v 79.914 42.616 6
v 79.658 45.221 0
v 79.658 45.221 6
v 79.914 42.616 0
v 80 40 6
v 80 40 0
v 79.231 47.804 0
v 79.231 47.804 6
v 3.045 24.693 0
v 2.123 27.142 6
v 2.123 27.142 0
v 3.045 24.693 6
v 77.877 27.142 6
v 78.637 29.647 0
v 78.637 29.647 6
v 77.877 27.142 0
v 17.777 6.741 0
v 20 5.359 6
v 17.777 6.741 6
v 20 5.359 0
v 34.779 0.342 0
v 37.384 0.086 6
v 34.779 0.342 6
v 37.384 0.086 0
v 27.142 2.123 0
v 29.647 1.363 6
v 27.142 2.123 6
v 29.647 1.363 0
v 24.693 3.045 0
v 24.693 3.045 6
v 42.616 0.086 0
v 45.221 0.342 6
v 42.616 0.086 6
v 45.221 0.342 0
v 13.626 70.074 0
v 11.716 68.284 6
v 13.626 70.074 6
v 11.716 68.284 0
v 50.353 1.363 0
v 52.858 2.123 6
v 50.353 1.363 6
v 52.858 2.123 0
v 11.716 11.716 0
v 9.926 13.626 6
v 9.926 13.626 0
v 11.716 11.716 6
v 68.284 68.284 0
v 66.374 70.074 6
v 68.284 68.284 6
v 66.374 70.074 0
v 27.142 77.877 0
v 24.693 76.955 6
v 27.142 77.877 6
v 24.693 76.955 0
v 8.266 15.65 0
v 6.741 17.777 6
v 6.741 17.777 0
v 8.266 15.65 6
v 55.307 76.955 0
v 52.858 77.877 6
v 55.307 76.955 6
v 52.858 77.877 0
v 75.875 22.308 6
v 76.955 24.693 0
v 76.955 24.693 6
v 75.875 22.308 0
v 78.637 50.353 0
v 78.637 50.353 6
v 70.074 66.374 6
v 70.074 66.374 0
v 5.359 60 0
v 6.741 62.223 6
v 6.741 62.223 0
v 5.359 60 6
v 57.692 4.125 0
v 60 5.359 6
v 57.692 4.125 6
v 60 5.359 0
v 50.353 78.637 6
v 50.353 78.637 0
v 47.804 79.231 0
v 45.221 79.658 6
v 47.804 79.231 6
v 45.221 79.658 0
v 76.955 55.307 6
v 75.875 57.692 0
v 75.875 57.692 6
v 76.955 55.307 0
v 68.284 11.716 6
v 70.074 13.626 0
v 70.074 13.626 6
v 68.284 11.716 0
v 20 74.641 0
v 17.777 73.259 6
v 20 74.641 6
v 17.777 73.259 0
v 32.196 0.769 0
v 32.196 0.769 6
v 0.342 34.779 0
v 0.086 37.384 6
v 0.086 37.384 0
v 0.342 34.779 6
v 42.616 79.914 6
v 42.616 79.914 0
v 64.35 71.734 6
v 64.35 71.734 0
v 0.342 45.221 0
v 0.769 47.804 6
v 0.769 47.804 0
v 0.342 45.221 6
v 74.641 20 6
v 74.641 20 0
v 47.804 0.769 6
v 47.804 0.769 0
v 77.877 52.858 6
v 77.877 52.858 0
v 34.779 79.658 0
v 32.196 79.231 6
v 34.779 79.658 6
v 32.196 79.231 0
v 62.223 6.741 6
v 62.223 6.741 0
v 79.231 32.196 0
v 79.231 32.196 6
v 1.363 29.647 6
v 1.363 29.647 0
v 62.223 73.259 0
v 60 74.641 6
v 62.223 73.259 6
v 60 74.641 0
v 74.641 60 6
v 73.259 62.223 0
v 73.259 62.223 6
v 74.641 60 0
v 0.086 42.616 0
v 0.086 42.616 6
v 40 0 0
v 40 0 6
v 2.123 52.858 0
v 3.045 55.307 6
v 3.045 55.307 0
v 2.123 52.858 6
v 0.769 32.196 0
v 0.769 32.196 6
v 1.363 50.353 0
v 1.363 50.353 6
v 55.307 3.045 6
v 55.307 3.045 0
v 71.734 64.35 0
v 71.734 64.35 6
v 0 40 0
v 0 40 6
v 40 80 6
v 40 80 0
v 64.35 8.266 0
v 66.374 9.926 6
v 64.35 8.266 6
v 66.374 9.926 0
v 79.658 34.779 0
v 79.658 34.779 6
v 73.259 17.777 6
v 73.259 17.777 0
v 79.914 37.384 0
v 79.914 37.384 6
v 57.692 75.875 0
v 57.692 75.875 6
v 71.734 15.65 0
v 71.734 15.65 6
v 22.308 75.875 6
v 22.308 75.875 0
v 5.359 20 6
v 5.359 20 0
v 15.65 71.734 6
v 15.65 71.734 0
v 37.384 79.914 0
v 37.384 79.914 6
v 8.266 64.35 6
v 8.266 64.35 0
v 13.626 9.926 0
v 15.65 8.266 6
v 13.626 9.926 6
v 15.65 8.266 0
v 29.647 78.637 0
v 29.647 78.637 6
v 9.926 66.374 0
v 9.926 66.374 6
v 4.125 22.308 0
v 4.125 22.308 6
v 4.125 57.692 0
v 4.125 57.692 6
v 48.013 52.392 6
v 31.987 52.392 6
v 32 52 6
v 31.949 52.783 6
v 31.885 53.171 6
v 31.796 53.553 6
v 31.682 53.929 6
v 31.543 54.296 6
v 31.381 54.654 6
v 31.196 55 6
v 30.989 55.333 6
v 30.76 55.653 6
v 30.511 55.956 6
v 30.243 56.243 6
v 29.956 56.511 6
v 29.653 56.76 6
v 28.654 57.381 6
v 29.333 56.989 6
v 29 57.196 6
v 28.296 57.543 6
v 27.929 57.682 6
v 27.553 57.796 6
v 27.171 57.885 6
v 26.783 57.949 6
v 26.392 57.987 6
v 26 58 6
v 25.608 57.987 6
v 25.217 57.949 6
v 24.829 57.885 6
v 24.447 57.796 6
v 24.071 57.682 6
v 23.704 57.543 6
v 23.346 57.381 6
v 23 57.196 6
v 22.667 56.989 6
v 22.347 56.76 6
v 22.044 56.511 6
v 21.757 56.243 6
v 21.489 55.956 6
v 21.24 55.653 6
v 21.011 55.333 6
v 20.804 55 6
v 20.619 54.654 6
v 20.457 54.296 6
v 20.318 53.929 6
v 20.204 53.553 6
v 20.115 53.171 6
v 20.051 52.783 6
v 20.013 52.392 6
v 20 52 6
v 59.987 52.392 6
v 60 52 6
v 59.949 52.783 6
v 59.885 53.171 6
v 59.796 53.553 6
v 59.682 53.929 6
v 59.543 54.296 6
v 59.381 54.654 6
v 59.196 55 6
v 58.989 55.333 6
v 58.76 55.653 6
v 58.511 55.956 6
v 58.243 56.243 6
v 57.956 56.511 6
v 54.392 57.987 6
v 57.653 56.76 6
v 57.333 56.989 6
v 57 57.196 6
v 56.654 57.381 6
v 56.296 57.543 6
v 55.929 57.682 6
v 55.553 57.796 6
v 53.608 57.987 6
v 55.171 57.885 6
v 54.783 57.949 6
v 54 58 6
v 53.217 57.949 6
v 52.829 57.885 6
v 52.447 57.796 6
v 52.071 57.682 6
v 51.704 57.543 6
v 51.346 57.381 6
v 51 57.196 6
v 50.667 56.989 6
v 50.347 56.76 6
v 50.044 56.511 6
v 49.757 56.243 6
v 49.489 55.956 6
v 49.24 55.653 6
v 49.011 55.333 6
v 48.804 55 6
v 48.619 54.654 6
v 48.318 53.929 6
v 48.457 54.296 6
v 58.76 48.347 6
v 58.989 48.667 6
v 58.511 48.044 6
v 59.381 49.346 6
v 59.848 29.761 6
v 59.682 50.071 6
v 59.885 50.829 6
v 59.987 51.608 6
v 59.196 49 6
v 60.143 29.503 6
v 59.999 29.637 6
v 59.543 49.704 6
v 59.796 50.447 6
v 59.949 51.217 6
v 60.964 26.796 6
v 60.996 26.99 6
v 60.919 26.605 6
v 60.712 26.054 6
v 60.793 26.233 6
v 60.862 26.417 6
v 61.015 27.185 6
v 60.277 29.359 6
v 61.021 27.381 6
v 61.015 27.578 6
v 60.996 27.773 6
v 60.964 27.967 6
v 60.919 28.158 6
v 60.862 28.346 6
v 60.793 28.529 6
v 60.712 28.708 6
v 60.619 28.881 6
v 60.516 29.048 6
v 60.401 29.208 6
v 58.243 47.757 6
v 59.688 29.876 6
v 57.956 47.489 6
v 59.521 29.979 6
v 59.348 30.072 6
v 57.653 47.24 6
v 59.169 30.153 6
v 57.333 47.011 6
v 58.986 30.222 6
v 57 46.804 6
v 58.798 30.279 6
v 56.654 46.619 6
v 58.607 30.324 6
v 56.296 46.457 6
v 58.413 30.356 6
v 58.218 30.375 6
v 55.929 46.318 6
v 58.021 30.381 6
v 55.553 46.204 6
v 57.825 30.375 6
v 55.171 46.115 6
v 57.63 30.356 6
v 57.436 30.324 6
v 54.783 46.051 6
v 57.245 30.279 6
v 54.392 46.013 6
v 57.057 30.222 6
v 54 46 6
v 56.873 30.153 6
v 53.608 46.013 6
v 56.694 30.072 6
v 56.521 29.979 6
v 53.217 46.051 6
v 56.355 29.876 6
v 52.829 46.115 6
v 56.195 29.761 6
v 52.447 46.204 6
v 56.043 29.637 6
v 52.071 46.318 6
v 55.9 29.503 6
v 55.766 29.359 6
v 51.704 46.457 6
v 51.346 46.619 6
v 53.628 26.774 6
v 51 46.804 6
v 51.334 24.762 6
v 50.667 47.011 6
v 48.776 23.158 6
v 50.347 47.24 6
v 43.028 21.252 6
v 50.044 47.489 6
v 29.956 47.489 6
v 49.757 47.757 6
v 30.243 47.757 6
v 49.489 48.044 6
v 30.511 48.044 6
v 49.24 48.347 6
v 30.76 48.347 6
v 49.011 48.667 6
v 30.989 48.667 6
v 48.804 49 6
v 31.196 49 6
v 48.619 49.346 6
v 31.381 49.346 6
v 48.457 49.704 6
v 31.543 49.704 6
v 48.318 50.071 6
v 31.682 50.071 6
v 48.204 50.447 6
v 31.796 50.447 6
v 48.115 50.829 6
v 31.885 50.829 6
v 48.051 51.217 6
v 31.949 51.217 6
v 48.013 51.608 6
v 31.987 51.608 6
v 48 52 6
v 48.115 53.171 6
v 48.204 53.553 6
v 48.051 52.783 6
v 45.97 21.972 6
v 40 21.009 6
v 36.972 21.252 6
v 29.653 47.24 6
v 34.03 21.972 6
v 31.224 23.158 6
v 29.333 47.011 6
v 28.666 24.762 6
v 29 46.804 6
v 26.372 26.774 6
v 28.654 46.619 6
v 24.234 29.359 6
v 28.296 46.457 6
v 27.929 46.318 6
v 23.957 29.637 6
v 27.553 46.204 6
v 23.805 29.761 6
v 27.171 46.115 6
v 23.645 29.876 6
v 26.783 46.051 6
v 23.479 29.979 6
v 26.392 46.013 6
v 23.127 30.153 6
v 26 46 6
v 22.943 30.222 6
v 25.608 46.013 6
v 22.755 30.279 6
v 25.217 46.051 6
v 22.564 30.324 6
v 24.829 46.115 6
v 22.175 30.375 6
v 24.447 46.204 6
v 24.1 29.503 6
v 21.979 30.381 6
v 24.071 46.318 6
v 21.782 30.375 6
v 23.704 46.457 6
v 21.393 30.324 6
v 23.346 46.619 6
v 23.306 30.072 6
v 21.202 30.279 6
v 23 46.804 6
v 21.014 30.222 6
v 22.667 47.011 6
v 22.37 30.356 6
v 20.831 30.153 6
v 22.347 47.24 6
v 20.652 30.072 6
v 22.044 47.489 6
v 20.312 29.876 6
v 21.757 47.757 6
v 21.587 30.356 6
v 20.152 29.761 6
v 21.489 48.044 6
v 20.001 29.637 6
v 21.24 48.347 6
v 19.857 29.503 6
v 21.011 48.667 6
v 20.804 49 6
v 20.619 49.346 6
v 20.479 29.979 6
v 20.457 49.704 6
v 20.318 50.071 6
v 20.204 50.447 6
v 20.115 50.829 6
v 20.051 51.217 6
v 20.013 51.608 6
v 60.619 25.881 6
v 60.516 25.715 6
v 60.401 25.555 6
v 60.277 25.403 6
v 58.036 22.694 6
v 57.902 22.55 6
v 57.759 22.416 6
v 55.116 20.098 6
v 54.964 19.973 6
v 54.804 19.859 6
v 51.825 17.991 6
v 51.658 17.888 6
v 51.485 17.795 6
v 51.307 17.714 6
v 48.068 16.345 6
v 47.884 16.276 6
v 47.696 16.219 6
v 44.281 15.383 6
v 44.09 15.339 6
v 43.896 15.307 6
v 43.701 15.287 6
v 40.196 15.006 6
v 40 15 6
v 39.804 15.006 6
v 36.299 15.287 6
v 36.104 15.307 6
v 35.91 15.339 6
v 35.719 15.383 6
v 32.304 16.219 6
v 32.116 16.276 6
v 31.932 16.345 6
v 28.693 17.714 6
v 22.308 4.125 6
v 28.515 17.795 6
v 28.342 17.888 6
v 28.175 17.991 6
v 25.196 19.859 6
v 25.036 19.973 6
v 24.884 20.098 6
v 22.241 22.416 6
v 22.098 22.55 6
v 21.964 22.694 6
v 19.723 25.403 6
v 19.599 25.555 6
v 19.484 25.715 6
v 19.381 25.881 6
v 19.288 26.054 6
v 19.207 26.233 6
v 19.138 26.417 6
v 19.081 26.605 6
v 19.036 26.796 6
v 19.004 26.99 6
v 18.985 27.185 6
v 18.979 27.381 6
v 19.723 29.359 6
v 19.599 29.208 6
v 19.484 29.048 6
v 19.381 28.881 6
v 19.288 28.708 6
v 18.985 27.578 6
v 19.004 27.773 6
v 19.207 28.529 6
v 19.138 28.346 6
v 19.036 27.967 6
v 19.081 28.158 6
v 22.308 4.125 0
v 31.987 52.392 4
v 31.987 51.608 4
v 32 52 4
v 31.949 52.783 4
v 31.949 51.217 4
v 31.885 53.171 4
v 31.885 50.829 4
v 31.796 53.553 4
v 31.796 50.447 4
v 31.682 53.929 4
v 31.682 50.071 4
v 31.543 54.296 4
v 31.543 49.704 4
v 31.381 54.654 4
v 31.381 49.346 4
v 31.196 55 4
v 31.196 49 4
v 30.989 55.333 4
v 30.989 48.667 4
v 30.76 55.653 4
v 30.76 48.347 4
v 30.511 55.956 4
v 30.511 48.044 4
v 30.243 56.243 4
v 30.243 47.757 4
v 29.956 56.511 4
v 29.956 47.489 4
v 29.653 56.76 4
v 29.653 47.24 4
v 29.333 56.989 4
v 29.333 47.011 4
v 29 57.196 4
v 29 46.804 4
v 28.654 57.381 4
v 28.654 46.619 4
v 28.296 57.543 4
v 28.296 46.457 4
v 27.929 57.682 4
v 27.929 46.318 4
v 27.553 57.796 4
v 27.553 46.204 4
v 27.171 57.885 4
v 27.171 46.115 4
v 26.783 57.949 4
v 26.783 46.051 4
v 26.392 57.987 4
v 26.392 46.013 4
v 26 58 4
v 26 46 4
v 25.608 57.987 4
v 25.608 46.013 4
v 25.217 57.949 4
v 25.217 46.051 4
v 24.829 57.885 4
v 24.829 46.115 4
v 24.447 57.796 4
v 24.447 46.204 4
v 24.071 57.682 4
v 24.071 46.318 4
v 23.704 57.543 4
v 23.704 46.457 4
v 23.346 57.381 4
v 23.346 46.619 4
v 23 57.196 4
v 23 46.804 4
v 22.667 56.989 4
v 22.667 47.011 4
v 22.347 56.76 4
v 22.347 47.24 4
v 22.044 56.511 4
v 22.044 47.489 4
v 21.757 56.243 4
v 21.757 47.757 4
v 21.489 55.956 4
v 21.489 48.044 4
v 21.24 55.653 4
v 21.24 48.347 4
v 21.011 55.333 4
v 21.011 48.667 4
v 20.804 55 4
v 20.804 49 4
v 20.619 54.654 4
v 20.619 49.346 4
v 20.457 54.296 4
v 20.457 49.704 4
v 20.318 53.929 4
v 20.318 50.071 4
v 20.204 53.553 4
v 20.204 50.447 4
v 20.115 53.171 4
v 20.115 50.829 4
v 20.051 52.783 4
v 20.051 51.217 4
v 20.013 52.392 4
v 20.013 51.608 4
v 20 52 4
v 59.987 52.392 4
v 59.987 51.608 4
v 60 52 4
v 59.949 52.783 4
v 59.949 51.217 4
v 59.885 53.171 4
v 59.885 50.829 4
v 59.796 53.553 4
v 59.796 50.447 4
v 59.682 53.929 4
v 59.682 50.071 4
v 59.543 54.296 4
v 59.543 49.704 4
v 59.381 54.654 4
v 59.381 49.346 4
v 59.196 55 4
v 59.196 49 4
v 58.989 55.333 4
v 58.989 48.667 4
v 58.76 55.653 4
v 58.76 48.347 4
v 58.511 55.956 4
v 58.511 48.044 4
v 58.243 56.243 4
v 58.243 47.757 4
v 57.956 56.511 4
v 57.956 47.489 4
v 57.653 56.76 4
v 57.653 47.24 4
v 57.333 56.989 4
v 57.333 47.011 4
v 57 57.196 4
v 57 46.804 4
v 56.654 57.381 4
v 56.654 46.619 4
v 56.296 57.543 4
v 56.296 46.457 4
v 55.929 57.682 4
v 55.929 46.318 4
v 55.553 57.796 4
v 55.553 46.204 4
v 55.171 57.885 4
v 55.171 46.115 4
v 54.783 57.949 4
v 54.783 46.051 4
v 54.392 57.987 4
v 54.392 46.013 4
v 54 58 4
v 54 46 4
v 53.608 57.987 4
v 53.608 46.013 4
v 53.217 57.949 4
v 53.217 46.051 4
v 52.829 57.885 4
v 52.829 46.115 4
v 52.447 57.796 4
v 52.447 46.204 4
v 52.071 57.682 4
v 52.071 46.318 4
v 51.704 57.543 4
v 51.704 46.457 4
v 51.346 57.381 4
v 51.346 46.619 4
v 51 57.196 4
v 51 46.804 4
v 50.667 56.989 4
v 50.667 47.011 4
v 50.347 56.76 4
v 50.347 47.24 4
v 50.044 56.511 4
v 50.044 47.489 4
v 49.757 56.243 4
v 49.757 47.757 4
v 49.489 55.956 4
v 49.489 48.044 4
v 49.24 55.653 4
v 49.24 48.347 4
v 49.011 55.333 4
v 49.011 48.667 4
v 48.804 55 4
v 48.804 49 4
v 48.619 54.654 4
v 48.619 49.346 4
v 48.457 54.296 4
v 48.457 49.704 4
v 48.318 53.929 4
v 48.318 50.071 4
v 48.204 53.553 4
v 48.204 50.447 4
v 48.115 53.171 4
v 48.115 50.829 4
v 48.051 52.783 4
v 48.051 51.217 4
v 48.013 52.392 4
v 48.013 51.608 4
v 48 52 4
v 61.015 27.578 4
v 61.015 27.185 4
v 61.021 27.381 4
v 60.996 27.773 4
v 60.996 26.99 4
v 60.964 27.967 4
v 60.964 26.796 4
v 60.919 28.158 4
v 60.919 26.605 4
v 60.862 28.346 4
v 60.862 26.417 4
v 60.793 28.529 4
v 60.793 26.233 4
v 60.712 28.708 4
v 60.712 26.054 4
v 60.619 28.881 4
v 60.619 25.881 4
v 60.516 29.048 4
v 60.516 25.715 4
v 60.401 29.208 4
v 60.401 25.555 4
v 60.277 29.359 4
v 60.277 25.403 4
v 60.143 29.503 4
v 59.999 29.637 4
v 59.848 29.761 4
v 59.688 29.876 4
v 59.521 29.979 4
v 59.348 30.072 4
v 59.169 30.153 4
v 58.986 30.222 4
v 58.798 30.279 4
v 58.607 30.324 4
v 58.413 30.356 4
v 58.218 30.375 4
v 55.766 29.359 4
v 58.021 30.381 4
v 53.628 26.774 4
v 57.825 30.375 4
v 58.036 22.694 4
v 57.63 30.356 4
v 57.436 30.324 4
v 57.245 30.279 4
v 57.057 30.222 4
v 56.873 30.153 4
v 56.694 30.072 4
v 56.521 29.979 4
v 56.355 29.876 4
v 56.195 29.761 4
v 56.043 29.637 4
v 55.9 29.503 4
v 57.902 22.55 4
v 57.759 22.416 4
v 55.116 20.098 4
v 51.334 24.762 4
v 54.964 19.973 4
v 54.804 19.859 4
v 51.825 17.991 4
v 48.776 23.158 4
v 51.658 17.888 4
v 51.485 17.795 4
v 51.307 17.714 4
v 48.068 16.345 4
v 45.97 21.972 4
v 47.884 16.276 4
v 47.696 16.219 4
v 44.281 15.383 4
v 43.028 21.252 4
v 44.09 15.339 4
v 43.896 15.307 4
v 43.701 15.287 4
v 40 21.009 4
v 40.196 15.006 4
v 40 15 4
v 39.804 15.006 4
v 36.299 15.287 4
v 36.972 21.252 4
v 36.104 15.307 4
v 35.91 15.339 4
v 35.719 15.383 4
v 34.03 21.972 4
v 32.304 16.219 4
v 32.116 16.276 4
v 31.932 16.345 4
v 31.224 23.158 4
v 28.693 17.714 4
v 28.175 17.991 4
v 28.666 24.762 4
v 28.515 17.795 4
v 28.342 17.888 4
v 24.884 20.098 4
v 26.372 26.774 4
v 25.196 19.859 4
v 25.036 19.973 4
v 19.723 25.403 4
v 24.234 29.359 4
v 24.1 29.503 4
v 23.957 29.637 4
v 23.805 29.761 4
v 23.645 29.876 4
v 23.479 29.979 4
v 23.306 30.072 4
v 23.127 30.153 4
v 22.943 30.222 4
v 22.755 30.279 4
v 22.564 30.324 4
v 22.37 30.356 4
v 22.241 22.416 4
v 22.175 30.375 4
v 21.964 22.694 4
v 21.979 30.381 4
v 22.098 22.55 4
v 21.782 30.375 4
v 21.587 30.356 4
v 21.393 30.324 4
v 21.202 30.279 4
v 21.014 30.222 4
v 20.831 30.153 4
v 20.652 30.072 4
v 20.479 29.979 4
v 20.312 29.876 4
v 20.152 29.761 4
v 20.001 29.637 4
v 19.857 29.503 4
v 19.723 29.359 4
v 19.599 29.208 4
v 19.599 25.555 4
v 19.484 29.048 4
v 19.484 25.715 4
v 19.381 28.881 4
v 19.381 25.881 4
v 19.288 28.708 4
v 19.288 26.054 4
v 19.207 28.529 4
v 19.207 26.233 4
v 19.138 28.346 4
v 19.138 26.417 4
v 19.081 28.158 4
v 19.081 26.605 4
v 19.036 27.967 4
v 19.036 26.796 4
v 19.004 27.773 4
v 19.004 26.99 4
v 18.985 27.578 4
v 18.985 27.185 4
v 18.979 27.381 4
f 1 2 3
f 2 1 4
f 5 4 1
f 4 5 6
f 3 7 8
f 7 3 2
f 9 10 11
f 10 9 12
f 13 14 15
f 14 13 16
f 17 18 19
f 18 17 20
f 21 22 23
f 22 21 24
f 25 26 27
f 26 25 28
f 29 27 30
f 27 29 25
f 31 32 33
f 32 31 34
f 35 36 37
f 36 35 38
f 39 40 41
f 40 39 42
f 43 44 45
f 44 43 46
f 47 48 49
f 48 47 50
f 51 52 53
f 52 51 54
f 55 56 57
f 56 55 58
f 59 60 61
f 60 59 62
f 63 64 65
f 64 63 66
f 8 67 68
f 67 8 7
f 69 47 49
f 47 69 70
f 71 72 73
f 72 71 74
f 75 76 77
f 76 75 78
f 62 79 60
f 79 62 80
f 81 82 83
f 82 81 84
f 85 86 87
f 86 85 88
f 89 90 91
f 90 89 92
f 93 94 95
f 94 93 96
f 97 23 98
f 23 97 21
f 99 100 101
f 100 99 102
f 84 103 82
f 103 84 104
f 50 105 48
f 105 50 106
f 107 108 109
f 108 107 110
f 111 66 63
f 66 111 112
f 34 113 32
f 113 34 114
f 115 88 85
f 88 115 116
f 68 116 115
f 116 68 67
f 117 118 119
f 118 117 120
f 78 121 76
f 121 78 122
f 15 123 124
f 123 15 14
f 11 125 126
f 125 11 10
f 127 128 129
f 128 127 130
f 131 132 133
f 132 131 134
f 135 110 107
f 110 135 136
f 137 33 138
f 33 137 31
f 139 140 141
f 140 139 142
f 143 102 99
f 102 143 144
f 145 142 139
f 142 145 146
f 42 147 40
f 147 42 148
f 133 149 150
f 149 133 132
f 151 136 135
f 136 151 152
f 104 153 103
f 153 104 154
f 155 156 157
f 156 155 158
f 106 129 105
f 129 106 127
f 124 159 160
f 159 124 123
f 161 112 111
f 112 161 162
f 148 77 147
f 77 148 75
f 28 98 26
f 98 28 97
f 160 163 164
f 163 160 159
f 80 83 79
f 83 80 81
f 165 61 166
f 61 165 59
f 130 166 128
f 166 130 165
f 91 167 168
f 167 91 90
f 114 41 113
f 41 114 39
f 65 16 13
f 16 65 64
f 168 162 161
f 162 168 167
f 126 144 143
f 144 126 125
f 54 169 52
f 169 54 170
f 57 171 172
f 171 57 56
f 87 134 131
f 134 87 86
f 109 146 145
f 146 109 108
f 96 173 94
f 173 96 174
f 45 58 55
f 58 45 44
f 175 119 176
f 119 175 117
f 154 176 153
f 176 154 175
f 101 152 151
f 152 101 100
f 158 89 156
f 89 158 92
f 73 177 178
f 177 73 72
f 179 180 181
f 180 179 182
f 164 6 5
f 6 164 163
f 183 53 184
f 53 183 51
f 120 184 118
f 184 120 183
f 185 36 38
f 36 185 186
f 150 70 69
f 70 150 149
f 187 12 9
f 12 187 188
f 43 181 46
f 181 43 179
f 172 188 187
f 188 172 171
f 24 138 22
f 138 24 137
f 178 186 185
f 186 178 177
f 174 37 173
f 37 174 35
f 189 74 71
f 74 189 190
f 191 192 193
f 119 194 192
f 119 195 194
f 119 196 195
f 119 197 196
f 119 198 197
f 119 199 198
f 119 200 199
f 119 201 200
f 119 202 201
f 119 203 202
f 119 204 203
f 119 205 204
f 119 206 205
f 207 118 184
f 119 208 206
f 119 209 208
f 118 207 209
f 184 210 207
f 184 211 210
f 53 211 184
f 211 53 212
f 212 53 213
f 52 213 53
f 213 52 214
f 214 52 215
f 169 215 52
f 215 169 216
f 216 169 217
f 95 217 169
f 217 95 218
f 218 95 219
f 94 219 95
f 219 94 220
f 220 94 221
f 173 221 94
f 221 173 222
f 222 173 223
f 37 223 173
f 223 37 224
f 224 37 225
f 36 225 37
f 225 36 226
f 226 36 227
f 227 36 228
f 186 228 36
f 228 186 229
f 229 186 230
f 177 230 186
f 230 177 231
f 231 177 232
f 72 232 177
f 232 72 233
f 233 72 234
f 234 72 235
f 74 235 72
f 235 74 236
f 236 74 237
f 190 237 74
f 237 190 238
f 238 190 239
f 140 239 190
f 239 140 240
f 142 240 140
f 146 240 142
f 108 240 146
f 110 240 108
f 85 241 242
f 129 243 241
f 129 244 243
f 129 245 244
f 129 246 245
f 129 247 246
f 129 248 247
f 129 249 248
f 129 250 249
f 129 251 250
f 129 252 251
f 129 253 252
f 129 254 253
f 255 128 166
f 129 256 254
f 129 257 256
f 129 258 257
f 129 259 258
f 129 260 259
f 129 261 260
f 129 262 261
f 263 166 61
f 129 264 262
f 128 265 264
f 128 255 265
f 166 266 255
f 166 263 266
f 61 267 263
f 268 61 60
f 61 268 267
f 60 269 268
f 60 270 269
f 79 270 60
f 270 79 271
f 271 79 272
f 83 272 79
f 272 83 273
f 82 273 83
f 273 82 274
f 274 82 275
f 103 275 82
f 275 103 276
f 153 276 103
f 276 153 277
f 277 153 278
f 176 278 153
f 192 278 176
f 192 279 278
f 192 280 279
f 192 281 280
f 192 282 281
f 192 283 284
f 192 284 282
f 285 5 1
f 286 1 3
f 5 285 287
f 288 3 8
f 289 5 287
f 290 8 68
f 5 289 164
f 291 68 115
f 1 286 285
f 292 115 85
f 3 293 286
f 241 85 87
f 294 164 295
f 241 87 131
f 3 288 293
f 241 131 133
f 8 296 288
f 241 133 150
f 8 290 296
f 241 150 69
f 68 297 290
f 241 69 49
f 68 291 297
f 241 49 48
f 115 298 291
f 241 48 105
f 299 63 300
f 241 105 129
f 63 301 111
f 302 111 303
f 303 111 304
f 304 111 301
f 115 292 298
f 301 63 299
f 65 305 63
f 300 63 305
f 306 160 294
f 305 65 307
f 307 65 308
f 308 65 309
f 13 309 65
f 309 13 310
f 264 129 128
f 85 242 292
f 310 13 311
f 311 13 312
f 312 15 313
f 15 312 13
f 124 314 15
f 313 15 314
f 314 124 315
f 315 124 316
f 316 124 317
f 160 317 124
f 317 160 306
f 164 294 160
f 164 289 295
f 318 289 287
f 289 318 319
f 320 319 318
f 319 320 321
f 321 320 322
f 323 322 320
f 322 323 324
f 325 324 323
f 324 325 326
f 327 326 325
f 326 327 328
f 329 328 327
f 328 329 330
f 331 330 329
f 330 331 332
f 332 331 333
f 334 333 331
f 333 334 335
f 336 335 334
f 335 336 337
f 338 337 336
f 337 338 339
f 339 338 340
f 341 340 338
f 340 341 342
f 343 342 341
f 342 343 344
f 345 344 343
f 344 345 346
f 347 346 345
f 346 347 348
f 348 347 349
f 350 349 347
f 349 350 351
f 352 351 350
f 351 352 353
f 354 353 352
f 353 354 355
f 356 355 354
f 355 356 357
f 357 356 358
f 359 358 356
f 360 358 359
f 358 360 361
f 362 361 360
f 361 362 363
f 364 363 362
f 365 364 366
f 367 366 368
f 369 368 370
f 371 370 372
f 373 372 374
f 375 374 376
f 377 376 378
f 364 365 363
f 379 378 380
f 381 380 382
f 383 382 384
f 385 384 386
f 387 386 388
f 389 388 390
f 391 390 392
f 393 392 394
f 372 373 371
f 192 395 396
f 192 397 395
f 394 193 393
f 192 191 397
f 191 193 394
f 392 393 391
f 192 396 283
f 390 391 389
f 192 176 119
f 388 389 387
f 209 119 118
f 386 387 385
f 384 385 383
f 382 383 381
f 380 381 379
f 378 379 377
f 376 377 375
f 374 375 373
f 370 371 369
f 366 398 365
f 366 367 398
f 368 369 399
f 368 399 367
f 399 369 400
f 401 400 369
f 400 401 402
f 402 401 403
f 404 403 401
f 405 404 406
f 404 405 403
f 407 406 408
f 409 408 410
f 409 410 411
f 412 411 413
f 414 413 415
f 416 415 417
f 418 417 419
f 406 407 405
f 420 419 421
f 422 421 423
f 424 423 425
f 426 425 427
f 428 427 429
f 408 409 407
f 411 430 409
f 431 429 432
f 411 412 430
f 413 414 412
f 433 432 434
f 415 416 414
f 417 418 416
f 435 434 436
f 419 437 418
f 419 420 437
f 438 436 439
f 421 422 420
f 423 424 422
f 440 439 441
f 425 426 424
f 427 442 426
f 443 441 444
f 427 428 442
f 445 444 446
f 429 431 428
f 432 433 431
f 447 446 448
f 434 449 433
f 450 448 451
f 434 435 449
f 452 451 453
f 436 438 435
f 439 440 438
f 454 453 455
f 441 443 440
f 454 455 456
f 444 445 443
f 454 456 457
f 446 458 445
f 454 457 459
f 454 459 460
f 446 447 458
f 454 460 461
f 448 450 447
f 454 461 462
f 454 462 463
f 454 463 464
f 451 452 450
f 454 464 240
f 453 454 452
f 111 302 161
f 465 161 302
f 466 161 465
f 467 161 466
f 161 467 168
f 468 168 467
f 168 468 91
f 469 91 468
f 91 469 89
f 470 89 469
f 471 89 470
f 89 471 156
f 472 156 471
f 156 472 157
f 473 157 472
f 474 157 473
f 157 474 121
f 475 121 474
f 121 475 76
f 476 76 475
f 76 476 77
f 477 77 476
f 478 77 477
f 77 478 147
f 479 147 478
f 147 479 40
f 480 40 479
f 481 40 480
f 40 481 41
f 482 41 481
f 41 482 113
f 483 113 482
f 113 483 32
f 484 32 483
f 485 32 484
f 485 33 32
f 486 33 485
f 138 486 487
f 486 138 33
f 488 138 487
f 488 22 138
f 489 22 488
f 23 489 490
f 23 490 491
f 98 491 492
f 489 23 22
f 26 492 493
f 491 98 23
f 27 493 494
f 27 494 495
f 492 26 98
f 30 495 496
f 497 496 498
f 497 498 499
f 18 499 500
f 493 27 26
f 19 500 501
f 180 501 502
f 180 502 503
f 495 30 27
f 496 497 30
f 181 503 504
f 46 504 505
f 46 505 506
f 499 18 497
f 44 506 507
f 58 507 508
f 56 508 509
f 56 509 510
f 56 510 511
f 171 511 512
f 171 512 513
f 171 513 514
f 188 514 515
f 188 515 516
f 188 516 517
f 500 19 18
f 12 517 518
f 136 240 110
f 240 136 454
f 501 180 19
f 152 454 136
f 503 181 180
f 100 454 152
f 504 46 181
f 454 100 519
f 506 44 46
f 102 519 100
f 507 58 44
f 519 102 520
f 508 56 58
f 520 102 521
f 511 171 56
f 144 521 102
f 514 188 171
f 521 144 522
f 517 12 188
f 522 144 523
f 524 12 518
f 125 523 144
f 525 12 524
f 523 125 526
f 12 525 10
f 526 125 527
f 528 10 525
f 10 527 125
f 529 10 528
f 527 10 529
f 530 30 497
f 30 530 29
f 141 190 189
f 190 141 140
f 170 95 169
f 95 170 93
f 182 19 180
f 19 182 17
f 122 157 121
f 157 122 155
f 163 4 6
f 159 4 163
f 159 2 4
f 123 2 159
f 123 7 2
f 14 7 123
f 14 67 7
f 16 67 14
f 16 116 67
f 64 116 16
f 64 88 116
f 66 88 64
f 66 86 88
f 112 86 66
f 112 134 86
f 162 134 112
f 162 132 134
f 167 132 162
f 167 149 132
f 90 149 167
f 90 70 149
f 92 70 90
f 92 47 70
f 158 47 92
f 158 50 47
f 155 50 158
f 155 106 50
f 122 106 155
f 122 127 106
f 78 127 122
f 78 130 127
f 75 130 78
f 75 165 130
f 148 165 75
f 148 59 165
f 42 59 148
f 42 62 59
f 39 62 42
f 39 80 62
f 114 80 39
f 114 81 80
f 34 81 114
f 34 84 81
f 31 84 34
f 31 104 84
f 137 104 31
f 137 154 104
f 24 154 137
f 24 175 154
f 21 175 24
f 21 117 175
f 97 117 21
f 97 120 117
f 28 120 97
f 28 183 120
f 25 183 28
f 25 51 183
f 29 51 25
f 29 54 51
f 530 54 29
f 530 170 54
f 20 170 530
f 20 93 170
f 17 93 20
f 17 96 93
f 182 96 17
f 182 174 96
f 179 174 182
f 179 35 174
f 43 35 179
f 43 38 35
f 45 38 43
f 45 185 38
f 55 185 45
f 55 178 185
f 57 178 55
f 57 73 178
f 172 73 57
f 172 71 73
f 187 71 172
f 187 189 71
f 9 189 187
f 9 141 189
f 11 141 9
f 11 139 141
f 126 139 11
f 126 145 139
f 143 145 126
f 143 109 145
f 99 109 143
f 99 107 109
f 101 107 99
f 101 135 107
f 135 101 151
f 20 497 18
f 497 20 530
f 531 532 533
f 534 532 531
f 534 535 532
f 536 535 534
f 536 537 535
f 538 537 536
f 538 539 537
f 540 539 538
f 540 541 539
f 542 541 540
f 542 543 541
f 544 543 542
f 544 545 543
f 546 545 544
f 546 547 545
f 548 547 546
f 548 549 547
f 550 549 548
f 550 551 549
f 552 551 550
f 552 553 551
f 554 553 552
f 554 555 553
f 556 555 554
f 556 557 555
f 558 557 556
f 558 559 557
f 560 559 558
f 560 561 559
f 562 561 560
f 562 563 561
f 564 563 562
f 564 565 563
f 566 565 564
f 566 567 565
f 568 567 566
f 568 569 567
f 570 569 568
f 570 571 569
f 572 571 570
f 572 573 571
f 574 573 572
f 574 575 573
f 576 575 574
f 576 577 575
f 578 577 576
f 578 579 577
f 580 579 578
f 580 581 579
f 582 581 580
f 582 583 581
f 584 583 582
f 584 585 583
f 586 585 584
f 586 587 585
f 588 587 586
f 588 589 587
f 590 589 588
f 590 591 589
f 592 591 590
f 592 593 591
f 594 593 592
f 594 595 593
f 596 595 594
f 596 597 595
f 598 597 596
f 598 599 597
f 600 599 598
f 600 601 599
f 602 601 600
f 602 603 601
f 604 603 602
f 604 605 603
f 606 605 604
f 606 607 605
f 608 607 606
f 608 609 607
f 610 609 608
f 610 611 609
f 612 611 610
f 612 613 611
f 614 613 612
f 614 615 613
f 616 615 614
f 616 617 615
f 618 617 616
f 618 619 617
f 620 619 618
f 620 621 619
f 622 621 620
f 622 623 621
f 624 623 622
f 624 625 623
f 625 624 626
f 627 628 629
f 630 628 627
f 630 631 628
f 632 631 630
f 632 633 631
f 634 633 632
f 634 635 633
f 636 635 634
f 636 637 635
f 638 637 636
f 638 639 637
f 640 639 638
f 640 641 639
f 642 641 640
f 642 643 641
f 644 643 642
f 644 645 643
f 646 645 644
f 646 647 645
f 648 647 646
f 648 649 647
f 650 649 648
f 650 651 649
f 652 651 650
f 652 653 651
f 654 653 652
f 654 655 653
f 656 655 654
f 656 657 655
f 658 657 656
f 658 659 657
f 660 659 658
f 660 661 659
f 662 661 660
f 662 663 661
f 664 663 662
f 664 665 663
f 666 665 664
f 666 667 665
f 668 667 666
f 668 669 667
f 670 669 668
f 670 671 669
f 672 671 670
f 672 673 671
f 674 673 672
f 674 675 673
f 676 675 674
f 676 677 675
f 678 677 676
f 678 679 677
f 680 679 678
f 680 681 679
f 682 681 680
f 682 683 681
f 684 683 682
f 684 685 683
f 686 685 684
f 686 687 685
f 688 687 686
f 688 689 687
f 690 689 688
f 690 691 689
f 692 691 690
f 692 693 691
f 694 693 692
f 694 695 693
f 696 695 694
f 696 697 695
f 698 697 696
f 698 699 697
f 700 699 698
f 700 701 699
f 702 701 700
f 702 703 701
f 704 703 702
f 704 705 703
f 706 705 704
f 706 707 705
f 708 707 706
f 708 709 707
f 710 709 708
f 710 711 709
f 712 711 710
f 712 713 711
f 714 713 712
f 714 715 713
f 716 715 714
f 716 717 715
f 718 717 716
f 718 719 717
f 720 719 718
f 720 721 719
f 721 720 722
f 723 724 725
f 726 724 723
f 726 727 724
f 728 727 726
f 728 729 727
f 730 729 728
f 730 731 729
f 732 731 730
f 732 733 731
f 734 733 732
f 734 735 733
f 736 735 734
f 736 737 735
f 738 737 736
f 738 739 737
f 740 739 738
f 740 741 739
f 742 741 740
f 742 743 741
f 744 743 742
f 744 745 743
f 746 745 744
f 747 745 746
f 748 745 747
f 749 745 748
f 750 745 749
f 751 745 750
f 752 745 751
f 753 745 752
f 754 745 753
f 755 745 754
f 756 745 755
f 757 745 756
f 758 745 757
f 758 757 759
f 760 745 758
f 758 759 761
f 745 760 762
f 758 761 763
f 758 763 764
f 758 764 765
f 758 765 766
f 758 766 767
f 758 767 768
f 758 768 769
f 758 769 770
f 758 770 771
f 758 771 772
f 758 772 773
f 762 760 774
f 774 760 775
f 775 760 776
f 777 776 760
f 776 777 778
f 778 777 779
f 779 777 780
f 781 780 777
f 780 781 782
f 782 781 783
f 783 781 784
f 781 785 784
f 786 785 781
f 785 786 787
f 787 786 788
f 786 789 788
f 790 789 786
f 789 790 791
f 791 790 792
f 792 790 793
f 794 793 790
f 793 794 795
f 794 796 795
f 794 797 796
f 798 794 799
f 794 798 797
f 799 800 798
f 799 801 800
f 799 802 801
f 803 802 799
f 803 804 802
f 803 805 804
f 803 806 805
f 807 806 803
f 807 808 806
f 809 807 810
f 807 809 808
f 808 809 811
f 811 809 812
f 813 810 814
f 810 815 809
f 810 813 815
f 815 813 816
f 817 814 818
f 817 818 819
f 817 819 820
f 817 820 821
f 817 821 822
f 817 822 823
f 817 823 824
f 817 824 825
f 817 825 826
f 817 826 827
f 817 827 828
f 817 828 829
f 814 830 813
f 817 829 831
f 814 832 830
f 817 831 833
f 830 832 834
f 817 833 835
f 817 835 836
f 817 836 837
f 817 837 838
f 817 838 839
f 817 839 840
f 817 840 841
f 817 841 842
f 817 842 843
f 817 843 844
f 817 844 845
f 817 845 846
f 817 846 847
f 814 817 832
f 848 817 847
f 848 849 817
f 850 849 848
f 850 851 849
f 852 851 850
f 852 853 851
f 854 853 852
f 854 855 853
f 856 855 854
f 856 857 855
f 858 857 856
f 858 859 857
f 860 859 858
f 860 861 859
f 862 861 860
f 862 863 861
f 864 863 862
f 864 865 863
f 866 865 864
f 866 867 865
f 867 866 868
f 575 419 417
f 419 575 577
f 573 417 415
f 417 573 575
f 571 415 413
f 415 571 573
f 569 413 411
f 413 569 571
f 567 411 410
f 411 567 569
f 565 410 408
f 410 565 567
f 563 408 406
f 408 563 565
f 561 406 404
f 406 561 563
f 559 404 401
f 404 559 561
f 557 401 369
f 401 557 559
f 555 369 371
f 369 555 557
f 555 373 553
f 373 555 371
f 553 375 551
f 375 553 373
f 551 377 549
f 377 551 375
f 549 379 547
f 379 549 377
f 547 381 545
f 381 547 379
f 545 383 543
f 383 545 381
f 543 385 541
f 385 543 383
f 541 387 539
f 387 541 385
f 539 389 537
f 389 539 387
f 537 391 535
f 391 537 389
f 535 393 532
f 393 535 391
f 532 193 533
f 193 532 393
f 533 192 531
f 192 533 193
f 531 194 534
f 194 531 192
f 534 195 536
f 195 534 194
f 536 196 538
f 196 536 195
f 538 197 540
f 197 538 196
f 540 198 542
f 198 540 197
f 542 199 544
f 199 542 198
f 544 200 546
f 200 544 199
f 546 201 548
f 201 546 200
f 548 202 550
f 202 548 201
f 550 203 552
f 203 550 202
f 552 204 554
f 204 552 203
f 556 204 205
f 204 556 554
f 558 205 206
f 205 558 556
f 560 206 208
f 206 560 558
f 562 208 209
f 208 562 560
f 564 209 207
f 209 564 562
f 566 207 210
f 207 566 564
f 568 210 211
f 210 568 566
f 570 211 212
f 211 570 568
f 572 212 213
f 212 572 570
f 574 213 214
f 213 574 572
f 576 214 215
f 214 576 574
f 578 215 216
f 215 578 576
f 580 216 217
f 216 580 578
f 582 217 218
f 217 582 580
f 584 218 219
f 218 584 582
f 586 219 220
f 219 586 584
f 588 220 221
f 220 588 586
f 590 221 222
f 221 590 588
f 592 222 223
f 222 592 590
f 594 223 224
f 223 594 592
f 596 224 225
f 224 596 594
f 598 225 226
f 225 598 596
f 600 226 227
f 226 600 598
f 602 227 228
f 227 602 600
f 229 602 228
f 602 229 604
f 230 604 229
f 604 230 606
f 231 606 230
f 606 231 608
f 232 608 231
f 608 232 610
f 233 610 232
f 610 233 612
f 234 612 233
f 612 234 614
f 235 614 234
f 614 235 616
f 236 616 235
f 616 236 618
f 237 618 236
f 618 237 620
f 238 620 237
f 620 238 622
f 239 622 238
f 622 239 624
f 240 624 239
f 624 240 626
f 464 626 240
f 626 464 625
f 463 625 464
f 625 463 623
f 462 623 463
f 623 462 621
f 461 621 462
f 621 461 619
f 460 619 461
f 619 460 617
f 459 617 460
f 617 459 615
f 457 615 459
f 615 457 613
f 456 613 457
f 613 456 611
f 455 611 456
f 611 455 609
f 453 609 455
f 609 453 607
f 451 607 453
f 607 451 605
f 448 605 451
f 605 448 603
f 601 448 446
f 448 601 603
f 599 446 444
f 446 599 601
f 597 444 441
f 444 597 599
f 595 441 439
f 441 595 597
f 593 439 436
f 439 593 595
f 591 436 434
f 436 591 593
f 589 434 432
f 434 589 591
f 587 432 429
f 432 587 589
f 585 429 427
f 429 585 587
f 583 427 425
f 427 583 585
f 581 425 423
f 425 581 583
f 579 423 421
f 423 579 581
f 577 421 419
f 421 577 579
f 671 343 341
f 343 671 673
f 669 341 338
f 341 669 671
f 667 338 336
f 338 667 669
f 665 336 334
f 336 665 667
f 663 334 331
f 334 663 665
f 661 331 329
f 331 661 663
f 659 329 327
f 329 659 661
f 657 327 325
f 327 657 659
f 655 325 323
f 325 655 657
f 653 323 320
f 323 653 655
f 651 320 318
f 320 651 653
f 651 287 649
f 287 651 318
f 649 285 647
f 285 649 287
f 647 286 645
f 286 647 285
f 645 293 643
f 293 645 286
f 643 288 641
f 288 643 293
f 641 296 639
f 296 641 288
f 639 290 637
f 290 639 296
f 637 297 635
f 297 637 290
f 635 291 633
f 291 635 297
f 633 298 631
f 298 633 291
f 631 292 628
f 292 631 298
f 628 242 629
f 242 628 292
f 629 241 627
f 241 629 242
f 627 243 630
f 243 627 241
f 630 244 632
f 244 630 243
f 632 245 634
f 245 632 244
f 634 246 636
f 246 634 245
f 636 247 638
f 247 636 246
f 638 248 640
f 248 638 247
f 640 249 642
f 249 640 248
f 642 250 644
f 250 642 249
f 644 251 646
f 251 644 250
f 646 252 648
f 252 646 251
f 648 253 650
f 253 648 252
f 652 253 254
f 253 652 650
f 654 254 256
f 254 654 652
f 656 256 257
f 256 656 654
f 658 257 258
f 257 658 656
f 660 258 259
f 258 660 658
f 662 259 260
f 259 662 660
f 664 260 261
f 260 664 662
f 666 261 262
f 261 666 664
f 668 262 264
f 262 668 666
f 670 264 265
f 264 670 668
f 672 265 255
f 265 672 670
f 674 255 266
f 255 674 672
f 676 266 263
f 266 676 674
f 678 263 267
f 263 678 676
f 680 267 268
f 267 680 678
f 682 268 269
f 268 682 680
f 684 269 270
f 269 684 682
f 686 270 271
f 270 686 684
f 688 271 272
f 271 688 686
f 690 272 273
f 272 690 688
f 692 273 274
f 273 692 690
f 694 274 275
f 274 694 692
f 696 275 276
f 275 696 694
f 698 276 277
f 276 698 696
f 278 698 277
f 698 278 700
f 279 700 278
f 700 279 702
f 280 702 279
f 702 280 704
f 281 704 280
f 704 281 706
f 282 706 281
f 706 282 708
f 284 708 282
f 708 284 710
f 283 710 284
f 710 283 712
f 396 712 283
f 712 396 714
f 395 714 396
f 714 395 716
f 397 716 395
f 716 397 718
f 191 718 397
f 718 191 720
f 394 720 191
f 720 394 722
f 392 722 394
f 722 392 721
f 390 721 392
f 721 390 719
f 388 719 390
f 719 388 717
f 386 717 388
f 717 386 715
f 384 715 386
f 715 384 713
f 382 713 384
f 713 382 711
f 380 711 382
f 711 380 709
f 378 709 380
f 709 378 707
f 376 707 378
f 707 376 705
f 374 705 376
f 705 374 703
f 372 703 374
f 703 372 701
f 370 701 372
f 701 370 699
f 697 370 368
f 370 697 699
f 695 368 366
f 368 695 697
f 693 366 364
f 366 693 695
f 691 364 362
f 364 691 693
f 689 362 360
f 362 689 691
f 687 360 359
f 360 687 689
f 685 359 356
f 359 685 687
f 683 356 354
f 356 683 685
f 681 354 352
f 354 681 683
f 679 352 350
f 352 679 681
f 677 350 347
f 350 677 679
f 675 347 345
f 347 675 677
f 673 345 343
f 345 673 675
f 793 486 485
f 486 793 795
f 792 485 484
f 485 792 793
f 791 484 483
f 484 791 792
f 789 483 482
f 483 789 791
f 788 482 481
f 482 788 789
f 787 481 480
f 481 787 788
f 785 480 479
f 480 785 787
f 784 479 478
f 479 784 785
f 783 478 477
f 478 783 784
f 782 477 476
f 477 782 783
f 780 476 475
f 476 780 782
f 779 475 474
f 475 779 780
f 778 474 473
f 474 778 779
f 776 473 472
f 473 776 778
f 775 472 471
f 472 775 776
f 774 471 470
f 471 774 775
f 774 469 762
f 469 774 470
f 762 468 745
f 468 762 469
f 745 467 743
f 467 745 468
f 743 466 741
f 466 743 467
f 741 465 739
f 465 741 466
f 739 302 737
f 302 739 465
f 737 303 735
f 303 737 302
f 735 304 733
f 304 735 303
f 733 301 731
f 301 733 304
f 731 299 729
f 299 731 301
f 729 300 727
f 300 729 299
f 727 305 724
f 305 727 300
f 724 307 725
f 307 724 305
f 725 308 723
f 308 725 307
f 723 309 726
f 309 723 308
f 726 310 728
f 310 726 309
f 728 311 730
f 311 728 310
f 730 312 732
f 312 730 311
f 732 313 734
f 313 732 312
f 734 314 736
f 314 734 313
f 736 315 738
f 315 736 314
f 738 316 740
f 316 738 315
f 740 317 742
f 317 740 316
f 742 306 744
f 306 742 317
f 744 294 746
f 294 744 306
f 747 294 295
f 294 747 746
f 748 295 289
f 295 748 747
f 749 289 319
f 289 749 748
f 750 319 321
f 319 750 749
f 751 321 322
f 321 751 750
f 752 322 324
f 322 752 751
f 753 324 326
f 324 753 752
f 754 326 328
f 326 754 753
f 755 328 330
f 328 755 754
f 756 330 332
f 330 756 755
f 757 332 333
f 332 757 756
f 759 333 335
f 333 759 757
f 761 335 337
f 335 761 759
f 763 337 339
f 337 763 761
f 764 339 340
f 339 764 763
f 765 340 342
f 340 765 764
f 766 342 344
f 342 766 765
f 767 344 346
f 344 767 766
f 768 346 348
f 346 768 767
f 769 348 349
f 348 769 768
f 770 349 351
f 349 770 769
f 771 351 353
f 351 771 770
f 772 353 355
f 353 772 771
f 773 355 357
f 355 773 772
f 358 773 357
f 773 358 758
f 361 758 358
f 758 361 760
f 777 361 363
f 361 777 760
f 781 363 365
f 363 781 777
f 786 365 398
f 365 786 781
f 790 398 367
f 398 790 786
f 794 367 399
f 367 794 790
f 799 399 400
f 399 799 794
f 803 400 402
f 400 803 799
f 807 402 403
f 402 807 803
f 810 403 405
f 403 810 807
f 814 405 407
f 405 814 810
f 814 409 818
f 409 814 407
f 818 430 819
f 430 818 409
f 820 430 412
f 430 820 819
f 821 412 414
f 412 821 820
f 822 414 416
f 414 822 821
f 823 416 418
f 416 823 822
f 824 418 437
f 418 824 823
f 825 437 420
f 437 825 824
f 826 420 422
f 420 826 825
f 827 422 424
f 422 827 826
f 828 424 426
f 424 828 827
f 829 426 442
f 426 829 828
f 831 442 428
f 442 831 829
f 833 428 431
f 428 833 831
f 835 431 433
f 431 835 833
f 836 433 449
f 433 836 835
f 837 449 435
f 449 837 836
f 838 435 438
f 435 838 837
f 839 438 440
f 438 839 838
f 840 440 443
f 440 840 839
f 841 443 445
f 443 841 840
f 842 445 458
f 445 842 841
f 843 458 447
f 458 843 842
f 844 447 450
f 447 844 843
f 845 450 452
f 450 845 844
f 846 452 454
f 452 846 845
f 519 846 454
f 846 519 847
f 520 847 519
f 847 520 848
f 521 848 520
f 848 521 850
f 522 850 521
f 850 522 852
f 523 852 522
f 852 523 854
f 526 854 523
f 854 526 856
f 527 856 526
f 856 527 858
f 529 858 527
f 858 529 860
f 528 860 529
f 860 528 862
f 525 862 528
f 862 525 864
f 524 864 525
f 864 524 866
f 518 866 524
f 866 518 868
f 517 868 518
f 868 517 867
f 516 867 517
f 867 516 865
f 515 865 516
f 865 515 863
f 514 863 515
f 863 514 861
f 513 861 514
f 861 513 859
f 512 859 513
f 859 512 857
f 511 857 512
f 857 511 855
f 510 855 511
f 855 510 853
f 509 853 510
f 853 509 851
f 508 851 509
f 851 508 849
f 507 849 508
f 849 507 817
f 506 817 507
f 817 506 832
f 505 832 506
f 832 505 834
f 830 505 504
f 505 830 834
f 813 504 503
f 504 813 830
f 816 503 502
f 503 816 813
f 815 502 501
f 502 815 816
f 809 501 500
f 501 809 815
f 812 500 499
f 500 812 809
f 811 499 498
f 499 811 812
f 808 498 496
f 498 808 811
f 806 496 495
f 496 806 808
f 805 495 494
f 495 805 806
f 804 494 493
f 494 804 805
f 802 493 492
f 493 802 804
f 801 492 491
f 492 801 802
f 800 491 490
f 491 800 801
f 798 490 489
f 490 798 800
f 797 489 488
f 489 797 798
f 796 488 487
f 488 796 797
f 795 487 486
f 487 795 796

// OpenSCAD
// Badge: a face or a word engraved in a plate. A face is drawn after its emoji from
// circles and strokes; its wrapper (apothecary/projects/parts/badge.py) places every
// eye, open mouth and stroke as this file does, as shares of the face's radius, and
// says the cuts that make a face on the router. A word is drawn in a font's outlines,
// and printed.
//
// The plate stands at the origin, its top at z = thickness: a face's centre at
// (diameter / 2, diameter / 2), a word's plate from (0, 0) to (width, height).
//
// Parameters:
//   kind          face or word
//   face          open, smile, neutral, wink, frown or grin: 😮 🙂 😐 😉 🙁 😀
//   text, font    the word, and the font it is drawn in (OpenSCAD's Liberation family)
//   diameter      a face, across (mm)
//   width, height a word's plate (mm)
//   text_size     the word's letters, high (mm)
//   thickness     the plate's (mm)
//   depth         how deep the face or the word is engraved (mm)
//   stroke        a face's strokes, wide: the router cuts them its tool's width (mm)
//   stock_margin  stock beyond a face on each side: the toolpath's, not drawn

kind = "face";
face = "smile";
text = "HELLO";
font = "Liberation Sans:style=Bold";
diameter = 80;         // [50:5:200]
width = 120;           // [30:5:220]
height = 40;           // [15:5:120]
text_size = 16;        // [4:1:80]
thickness = 6;         // [2:1:40]
depth = 2;             // [0.5:0.5:20]
stroke = 6;            // [1:0.5:12]
stock_margin = 10;     // [0:1:50]

/* [Hidden] */
$fn = 96;
// Shares of the face's radius, as the wrapper has them: each eye out and up and its
// diameter; an open mouth down and its diameter; the smile's arc about the centre and the
// frown's below it, each in ARC_SEGMENTS chords; a line's half length and its drop.
EYE_OUT = 0.35; EYE_UP = 0.3; EYE = 0.3;
MOUTH_DOWN = 0.4; MOUTH = 0.5;
ARC = 0.55; ARC_SEGMENTS = 12; FROWN_DOWN = 0.95;
LINE_HALF = 0.3; LINE_DOWN = 0.4;
// What a word keeps clear of its plate's edge.
WORD_MARGIN = 3;

function arc(cy, r, a0, a1) =
    [for (k = [0:ARC_SEGMENTS]) let (a = a0 + (a1 - a0) * k / ARC_SEGMENTS) [r * cos(a), cy + r * sin(a)]];

// A stroke the width of `stroke` along a line's points: what a tool that wide leaves
// when its centre runs along them.
module stroke_along(points) {
    for (i = [0:len(points) - 2])
        hull() {
            translate(points[i]) circle(d = stroke);
            translate(points[i + 1]) circle(d = stroke);
        }
}

module face_marks(r) {
    // The eyes: both, or the left alone where the right winks.
    for (side = face == "wink" ? [-1] : [-1, 1])
        translate([side * EYE_OUT * r, EYE_UP * r]) circle(d = EYE * r);
    if (face == "open") translate([0, -MOUTH_DOWN * r]) circle(d = MOUTH * r);
    if (face == "smile" || face == "wink") stroke_along(arc(0, ARC * r, 215, 325));
    if (face == "grin") let (a = arc(0, ARC * r, 200, 340)) stroke_along(concat(a, [a[0]]));
    if (face == "frown") stroke_along(arc(-FROWN_DOWN * r, ARC * r, 55, 125));
    if (face == "neutral") stroke_along([[-LINE_HALF * r, -LINE_DOWN * r], [LINE_HALF * r, -LINE_DOWN * r]]);
    if (face == "wink") stroke_along([[(EYE_OUT - EYE / 2) * r, EYE_UP * r], [(EYE_OUT + EYE / 2) * r, EYE_UP * r]]);
}

module face_badge() {
    r = diameter / 2;
    translate([r, r, 0])
        difference() {
            cylinder(r = r, h = thickness);
            translate([0, 0, thickness - depth]) linear_extrude(depth + 1) face_marks(r);
        }
}

module plate() {
    c = min(height / 4, 6);
    translate([c, c]) offset(r = c) square([width - 2 * c, height - 2 * c]);
}

module word_badge() {
    difference() {
        linear_extrude(thickness) plate();
        translate([0, 0, thickness - depth])
            linear_extrude(depth + 1)
                intersection() {
                    offset(delta = -WORD_MARGIN) plate();
                    translate([width / 2, height / 2])
                        text(text, size = text_size, font = font, halign = "center", valign = "center");
                }
    }
}

if (kind == "word") word_badge(); else face_badge();
